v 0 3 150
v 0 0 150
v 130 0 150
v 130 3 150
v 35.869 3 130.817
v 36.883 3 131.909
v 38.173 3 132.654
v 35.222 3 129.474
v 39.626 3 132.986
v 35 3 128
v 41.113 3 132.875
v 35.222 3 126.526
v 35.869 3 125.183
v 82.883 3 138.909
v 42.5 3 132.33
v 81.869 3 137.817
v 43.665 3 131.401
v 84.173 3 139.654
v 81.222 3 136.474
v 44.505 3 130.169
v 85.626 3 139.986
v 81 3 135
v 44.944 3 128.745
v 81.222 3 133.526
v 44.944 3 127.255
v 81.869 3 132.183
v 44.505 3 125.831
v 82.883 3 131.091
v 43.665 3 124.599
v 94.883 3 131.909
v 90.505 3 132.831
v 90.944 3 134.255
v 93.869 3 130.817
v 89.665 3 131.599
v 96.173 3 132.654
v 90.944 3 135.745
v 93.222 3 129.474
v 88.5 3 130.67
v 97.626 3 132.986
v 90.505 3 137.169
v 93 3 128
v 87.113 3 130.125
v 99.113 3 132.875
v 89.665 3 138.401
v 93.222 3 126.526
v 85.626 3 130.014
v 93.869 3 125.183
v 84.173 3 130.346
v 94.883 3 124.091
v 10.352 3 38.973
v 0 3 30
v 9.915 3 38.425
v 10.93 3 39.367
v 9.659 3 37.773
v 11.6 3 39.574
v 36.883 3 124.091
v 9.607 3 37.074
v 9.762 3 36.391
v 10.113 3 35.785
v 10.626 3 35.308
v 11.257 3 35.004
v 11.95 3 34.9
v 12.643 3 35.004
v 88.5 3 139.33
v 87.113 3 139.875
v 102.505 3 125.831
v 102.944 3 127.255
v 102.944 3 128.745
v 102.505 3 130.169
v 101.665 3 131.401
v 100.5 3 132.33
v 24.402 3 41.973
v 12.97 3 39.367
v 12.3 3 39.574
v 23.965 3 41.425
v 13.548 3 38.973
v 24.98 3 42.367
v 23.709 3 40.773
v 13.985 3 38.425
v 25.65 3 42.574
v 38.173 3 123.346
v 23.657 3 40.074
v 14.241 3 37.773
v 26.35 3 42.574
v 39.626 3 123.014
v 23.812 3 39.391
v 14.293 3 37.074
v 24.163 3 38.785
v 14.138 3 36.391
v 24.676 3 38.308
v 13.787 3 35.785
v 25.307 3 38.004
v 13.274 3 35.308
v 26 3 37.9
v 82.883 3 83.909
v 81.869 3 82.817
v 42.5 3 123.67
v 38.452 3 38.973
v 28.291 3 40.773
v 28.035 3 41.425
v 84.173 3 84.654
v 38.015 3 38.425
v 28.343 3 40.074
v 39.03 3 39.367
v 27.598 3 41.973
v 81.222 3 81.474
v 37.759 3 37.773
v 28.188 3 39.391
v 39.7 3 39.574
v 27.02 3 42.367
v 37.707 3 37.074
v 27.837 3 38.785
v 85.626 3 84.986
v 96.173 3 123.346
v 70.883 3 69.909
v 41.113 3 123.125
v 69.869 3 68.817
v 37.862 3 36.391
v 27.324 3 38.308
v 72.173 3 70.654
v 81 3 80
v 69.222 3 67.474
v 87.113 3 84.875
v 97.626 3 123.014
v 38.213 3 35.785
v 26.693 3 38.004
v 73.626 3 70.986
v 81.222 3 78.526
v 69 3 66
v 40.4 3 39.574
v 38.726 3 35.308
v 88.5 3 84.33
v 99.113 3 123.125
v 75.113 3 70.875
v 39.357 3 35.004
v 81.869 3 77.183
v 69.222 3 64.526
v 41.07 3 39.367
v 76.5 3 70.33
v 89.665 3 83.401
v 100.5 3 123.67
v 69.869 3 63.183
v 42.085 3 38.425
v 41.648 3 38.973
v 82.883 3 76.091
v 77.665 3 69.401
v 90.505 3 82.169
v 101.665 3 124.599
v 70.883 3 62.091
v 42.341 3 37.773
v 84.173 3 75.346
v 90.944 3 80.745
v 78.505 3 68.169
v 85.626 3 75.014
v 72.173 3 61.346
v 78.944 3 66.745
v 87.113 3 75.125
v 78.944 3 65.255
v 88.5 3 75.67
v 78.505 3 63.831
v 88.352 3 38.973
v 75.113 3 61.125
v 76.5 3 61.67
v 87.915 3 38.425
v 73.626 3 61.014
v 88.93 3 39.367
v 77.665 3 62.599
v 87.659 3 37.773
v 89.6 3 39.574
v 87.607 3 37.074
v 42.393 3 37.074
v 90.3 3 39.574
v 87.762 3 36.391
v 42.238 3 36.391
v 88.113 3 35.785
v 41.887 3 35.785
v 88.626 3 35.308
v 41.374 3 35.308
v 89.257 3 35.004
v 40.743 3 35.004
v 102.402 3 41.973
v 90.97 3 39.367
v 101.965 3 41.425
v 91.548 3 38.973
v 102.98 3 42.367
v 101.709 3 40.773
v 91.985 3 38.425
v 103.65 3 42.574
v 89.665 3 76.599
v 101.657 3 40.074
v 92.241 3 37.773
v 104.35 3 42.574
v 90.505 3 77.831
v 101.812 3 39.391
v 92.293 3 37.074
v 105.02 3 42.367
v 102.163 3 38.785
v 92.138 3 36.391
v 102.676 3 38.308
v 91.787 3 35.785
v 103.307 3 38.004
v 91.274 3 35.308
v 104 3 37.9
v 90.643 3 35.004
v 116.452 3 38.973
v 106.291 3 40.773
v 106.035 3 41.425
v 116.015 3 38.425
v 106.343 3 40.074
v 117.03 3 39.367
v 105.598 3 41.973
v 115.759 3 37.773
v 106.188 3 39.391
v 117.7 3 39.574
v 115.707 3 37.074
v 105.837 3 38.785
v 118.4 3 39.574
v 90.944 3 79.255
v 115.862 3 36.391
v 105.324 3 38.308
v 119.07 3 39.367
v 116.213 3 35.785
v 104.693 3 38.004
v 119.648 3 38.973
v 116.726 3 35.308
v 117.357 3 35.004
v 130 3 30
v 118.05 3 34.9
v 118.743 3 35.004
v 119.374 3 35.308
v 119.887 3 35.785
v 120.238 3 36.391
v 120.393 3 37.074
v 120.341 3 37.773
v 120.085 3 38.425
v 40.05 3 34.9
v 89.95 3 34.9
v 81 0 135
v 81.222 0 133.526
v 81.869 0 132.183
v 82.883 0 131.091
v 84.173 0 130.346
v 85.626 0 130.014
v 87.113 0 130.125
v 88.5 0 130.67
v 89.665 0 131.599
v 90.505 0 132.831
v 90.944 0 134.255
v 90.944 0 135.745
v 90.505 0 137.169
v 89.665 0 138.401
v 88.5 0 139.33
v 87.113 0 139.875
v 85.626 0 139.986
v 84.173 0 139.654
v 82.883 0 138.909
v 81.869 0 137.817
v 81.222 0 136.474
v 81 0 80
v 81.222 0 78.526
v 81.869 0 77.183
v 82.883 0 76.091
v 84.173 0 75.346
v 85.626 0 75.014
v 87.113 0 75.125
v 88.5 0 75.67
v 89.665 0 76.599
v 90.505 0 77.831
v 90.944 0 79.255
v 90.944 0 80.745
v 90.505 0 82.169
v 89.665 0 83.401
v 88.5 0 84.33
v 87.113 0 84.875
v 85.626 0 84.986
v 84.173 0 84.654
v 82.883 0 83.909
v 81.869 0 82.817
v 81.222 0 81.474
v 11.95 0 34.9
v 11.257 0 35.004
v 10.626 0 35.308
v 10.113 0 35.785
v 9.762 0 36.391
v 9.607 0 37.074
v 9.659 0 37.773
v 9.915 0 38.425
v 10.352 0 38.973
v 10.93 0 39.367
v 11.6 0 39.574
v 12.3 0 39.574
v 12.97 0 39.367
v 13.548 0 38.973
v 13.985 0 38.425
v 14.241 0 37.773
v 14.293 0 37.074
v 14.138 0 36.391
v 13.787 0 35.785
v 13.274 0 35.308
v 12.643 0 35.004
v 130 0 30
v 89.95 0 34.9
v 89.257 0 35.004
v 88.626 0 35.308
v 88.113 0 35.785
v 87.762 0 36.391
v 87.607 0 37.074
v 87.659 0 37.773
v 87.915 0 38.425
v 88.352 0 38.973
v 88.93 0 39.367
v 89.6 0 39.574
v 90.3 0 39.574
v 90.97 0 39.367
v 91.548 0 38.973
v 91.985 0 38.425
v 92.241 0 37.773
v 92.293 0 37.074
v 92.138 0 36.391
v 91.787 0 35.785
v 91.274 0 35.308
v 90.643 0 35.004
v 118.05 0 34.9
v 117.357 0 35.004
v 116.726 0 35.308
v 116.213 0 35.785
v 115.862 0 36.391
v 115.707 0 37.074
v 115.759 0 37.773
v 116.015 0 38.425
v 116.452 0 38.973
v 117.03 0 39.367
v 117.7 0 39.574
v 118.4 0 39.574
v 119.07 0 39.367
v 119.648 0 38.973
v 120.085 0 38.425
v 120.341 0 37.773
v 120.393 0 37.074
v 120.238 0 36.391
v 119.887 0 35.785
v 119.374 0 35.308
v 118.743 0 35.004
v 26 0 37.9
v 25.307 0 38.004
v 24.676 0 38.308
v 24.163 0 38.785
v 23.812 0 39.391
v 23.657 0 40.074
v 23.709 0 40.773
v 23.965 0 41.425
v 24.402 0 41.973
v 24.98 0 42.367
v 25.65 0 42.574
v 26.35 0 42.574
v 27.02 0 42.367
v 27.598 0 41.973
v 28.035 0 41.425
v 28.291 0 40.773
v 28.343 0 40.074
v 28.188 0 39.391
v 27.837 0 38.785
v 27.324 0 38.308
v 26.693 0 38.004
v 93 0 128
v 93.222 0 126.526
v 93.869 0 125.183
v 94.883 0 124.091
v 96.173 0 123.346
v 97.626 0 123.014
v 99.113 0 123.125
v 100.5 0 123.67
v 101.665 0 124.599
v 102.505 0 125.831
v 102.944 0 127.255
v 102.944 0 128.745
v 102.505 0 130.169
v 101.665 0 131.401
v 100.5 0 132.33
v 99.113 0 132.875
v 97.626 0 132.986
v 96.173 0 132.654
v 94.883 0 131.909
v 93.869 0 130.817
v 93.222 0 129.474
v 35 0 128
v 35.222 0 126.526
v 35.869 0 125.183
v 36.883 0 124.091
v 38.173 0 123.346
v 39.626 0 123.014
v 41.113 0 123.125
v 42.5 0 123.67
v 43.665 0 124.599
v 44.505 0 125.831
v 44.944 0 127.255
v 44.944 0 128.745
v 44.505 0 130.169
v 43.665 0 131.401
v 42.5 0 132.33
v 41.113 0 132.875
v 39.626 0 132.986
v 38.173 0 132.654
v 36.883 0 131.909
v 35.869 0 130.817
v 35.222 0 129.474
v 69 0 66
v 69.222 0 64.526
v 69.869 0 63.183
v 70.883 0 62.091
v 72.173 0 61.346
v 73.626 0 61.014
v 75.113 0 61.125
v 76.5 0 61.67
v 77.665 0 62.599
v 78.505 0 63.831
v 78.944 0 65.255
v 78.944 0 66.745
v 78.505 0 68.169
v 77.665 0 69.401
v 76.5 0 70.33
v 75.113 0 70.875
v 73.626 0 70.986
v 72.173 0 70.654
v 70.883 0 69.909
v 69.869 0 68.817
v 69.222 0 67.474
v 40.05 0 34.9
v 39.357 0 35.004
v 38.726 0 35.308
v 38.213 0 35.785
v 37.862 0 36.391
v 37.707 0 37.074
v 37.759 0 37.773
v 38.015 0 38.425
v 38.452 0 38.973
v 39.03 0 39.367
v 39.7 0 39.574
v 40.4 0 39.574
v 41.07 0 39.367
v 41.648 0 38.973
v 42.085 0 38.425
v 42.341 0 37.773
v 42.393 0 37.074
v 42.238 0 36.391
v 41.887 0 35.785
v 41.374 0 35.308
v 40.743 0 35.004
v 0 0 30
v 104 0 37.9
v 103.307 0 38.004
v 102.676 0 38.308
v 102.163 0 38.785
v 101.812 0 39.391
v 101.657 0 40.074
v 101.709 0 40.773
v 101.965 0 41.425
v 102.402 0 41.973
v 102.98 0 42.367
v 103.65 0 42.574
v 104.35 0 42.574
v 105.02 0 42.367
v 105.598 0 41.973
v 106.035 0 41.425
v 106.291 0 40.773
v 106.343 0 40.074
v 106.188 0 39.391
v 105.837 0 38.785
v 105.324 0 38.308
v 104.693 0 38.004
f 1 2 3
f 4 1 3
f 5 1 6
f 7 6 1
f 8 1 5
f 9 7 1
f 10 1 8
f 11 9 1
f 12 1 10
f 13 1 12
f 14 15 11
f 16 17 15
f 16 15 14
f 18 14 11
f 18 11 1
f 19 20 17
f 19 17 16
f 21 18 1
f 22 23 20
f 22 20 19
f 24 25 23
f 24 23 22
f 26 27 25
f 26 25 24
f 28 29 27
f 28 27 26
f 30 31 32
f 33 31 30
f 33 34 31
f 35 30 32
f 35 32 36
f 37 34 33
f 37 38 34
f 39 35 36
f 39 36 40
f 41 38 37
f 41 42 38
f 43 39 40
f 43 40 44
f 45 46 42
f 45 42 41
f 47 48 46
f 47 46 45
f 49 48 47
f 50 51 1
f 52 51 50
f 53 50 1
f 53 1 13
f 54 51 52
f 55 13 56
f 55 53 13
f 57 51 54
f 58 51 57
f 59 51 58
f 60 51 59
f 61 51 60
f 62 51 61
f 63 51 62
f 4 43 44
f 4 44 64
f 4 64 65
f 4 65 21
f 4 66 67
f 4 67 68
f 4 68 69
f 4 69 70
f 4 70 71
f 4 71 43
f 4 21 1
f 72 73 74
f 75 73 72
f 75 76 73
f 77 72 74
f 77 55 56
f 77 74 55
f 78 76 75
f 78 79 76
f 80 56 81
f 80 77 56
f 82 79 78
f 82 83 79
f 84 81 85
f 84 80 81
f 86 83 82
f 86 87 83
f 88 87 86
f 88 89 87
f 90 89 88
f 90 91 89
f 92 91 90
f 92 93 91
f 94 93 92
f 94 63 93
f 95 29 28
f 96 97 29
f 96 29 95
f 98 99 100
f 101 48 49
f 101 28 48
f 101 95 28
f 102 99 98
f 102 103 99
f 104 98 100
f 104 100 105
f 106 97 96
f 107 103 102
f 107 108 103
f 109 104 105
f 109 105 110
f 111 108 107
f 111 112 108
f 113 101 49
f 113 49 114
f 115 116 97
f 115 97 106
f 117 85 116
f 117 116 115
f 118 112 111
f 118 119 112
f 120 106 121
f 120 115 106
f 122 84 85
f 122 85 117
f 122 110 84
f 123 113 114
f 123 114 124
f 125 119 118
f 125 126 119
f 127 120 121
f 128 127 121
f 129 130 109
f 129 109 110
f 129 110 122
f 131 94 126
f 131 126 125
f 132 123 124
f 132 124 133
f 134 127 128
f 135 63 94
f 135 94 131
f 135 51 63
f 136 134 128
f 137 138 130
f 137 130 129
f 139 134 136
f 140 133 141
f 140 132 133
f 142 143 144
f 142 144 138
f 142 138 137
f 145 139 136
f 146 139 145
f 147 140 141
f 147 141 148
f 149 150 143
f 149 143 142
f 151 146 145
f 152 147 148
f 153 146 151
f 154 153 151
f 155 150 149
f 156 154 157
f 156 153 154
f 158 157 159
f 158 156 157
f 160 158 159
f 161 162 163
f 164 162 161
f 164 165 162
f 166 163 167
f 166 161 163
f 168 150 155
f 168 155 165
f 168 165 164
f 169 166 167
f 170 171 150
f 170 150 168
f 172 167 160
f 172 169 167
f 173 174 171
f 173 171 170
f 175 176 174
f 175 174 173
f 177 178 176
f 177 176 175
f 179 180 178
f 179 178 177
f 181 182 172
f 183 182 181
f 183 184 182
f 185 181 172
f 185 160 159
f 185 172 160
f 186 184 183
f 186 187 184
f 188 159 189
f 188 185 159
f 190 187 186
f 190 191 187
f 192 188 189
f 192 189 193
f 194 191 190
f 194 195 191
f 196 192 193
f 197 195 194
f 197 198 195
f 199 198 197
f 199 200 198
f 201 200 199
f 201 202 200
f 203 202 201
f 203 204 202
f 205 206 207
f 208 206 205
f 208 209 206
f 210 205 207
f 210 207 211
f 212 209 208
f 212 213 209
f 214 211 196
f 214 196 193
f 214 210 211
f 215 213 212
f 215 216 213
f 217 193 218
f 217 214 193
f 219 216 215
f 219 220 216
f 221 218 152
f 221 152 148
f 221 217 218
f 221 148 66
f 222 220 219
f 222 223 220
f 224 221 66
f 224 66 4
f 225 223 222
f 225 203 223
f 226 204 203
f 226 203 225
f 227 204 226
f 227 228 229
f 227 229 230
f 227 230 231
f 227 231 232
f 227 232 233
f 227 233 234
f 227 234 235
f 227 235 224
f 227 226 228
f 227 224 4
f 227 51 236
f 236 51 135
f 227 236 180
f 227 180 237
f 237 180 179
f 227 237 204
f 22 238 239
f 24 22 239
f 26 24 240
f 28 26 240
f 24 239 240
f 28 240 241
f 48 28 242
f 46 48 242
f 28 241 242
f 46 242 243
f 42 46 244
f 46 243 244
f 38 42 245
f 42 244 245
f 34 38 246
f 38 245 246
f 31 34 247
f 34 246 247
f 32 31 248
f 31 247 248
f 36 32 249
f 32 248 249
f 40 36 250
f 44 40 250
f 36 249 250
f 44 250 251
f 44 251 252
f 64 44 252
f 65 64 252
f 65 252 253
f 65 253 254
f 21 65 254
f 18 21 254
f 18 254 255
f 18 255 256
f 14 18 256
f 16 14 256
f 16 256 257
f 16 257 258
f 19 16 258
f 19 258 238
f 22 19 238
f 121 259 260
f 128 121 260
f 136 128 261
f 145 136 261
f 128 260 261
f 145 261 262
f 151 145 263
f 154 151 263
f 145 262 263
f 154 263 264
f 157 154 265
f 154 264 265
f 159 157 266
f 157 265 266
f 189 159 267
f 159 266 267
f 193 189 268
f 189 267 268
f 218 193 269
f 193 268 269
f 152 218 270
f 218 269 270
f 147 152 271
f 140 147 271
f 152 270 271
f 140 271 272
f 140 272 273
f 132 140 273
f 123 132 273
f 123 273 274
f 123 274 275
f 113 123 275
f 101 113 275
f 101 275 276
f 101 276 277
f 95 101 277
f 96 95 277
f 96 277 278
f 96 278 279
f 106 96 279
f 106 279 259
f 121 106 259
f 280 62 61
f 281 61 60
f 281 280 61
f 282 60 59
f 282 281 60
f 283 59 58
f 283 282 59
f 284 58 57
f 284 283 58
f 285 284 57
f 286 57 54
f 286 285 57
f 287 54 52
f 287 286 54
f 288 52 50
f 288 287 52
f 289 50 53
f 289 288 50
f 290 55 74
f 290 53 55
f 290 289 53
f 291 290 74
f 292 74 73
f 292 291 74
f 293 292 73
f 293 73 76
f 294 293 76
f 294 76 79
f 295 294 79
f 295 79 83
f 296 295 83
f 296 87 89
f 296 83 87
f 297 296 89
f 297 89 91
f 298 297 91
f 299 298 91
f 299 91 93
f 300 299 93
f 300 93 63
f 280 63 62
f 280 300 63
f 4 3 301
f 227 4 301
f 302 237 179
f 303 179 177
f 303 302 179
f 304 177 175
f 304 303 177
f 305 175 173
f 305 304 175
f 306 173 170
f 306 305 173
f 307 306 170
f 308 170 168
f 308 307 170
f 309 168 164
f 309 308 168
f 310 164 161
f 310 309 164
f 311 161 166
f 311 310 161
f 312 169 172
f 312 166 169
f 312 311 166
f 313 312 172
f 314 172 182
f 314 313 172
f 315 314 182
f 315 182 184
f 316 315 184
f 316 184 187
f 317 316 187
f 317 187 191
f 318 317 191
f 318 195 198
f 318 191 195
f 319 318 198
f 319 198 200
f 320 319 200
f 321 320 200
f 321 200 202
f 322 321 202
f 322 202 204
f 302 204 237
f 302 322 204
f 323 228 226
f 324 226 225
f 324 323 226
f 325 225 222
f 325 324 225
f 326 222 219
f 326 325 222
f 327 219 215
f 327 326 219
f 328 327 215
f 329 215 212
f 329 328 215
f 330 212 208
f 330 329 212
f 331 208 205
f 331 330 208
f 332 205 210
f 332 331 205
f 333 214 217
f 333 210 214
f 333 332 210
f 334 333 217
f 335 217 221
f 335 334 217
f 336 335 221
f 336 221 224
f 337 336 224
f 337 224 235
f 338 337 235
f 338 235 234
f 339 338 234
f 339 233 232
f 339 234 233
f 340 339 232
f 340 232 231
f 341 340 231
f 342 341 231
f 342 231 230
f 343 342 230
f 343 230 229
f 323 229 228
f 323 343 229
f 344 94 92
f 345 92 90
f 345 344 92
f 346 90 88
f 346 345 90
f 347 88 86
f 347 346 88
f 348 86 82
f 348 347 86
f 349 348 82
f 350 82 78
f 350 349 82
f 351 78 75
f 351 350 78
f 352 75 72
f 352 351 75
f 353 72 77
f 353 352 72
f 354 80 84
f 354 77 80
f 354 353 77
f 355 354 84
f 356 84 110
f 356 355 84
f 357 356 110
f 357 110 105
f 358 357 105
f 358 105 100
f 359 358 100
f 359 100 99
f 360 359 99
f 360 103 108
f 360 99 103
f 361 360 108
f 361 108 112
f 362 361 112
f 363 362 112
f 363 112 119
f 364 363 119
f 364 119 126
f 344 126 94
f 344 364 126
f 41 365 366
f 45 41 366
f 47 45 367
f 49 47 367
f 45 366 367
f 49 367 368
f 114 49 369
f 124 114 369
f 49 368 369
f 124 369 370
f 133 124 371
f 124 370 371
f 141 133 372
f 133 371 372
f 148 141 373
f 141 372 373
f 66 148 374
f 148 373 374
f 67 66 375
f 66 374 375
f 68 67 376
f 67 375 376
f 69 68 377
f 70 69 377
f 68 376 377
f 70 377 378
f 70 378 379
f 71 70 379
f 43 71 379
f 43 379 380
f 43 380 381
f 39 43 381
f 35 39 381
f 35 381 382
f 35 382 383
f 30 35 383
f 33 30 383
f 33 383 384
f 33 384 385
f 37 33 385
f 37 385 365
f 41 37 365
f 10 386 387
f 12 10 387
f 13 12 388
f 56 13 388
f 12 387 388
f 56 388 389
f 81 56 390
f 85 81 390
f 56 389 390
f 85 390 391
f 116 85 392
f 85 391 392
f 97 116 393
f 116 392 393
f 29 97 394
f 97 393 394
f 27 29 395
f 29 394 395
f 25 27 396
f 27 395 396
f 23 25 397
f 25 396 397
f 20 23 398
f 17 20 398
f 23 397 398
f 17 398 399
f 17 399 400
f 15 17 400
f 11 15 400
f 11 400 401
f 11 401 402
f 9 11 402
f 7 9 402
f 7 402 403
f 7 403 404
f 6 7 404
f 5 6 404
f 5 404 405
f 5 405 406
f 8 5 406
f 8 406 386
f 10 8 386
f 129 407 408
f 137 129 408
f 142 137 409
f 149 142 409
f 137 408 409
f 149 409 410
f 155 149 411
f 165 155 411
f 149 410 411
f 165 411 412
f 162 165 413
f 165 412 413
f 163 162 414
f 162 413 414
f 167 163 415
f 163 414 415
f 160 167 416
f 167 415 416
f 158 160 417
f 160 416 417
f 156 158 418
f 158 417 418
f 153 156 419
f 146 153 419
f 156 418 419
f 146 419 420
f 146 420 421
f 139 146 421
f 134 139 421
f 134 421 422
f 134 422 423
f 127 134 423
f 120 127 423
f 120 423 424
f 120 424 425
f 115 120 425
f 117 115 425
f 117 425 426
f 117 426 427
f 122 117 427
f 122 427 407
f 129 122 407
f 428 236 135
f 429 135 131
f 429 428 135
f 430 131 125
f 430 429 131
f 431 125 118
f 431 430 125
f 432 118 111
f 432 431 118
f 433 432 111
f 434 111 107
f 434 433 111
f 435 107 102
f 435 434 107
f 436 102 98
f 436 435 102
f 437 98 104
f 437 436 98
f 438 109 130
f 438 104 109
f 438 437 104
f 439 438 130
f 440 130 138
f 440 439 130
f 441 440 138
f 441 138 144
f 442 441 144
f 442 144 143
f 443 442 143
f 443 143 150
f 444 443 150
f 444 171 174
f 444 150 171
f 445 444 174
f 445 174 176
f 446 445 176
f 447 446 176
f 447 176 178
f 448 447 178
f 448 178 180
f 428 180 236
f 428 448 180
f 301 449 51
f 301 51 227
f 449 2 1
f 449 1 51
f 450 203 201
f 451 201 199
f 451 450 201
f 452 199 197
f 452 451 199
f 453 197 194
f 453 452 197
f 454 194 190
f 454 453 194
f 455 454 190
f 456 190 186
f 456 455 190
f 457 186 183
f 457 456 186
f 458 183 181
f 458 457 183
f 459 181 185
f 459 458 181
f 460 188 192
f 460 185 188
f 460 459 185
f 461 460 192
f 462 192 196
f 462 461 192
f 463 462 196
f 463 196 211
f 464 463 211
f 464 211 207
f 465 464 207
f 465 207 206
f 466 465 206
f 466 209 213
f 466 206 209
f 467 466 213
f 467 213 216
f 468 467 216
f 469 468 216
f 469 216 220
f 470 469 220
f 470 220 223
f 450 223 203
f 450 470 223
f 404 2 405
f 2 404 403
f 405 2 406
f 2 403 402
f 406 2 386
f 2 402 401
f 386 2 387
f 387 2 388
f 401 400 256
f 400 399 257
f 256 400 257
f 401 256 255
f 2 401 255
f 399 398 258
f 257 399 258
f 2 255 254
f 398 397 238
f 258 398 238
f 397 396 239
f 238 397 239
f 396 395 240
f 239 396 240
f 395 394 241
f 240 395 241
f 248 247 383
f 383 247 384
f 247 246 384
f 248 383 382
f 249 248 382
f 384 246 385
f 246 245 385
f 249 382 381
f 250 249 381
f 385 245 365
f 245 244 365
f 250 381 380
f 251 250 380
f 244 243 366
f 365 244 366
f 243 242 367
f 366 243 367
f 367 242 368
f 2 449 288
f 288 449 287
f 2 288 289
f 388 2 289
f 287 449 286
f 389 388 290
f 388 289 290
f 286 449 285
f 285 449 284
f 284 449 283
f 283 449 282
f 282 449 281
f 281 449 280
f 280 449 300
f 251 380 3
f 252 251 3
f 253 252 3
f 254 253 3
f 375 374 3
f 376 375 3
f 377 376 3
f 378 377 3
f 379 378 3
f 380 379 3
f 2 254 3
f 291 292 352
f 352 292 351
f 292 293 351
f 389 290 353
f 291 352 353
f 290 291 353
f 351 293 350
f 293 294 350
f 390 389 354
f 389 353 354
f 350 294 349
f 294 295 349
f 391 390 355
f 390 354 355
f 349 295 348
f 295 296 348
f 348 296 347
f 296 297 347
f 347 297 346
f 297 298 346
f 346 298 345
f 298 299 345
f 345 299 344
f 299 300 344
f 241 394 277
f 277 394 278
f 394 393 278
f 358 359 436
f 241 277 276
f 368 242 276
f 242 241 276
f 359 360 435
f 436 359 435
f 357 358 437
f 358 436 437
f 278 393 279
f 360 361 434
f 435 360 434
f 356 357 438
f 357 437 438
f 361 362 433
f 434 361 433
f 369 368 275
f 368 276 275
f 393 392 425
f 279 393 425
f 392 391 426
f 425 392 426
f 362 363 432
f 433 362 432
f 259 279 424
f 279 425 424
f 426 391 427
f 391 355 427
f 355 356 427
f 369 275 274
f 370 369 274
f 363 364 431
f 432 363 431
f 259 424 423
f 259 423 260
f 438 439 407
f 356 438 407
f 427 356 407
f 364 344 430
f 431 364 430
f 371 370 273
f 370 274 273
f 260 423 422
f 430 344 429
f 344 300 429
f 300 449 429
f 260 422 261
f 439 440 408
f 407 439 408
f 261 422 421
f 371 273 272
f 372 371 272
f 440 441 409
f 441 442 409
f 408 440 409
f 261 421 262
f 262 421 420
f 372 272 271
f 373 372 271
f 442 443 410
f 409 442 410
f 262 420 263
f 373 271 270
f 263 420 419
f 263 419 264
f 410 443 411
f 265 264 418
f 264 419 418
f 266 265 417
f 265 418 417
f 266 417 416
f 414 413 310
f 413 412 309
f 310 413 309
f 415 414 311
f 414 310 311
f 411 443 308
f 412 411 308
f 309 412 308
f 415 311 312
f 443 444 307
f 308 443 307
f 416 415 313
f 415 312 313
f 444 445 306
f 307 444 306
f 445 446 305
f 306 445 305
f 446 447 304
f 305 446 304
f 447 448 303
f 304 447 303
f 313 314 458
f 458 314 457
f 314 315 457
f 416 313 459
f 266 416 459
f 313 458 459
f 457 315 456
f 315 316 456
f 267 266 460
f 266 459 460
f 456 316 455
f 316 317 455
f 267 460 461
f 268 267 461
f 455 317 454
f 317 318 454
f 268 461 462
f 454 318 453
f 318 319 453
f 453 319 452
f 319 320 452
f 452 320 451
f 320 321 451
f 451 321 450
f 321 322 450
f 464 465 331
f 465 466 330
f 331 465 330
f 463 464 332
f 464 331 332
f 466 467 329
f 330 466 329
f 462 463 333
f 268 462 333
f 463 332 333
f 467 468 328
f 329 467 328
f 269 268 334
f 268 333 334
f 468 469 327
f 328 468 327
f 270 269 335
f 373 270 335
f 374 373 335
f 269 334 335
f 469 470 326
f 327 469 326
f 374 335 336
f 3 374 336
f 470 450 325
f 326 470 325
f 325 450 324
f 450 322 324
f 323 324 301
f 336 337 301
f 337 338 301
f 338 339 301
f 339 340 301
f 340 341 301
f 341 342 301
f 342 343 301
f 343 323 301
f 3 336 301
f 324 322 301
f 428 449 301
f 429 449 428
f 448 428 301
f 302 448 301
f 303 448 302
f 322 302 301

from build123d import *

# Parameters (mm, degrees)
SKETCH1_W                  = 130
SKETCH1_H                  = 150
BOSS_EXTRUDE1_DEPTH        = 3
F_10_0_10_DIAMETER_HOLE2_D = 10
F_14_0_14_DIAMETER_HOLE1_D = 14
F_5_0_5_DIAMETER_HOLE1_D   = 5
F_10_0_10_DIAMETER_HOLE1_D = 10
F_9_0_9_DIAMETER_HOLE1_D   = 9
F_5_0_5_DIAMETER_HOLE2_D   = 5
SKETCH15_W                 = 130
SKETCH15_H                 = 30
CUT_EXTRUDE1_DEPTH         = 199.517001791
SKETCH16_R                 = 2.35
CUT_EXTRUDE2_DEPTH         = 199.517001791


with BuildPart() as part:
    # Sketch1 → Boss-Extrude1 (new body)
    with BuildSketch(Plane(origin=(0, 0, 0), x_dir=(1, 0, 0), z_dir=(0, 1, 0))):
        with Locations((65, -75)):
            Rectangle(SKETCH1_W, SKETCH1_H)
    extrude(amount=BOSS_EXTRUDE1_DEPTH)

    # Ø10.0 (10) Diameter Hole2 (through all)
    with Locations(Plane(origin=(0, 3, 0), x_dir=(1, 0, 0), z_dir=(0, 1, 0))):
        with Locations((40, -128), (98, -128), (74, -66)):
            Hole(F_10_0_10_DIAMETER_HOLE2_D / 2)

    # Ø14.0 (14) Diameter Hole1 (through all)
    with Locations(Plane(origin=(0, 3, 0), x_dir=(1, 0, 0), z_dir=(0, 1, 0))):
        with Locations((16, -16), (114, -16)):
            Hole(F_14_0_14_DIAMETER_HOLE1_D / 2)

    # Ø5.0 (5) Diameter Hole1 (through all)
    with Locations(Plane(origin=(0, 3, 0), x_dir=(1, 0, 0), z_dir=(0, 1, 0))):
        with Locations((4.686291501, -27.313708499), (4.686291501, -4.686291501), (27.313708499, -4.686291501), (27.313708499, -27.313708499), (102.686291501, -27.313708499), (125.313708499, -27.313708499), (125.313708499, -4.686291501), (102.686291501, -4.686291501)):
            Hole(F_5_0_5_DIAMETER_HOLE1_D / 2)

    # Ø10.0 (10) Diameter Hole1 (through all)
    with Locations(Plane(origin=(0, 3, 0), x_dir=(1, 0, 0), z_dir=(0, 1, 0))):
        with Locations((86, -135), (86, -80)):
            Hole(F_10_0_10_DIAMETER_HOLE1_D / 2)

    # Ø9.0 (9) Diameter Hole1 (through all)
    with Locations(Plane(origin=(0, 3, 0), x_dir=(1, 0, 0), z_dir=(0, 1, 0))):
        with Locations((65, -16)):
            Hole(F_9_0_9_DIAMETER_HOLE1_D / 2)

    # Ø5.0 (5) Diameter Hole2 (through all)
    with Locations(Plane(origin=(0, 3, 0), x_dir=(1, 0, 0), z_dir=(0, 1, 0))):
        with Locations((53.686291501, -27.313708499), (76.313708499, -27.313708499), (76.313708499, -4.686291501), (53.686291501, -4.686291501)):
            Hole(F_5_0_5_DIAMETER_HOLE2_D / 2)

    # Sketch15 → Cut-Extrude1 (cut, through all)
    with BuildSketch(Plane(origin=(0, 0, 0), x_dir=(1, 0, 0), z_dir=(0, 1, 0))):
        with Locations((65, -15)):
            Rectangle(SKETCH15_W, SKETCH15_H)
    extrude(amount=CUT_EXTRUDE1_DEPTH, mode=Mode.SUBTRACT)

    # Sketch16 → Cut-Extrude2 (cut, through all)
    with BuildSketch(Plane(origin=(0, 0, 0), x_dir=(1, 0, 0), z_dir=(0, 1, 0))):
        with Locations(Location((89.95, -37.25, 0), (0, 0, 90))):
            Circle(SKETCH16_R)
        with Locations(Location((118.05, -37.25, 0), (0, 0, 90))):
            Circle(SKETCH16_R)
        with Locations(Location((104, -40.25, 0), (0, 0, 90))):
            Circle(SKETCH16_R)
        with Locations(Location((11.95, -37.25, 0), (0, 0, 90))):
            Circle(SKETCH16_R)
        with Locations(Location((40.05, -37.25, 0), (0, 0, 90))):
            Circle(SKETCH16_R)
        with Locations(Location((26, -40.25, 0), (0, 0, 90))):
            Circle(SKETCH16_R)
    extrude(amount=CUT_EXTRUDE2_DEPTH, mode=Mode.SUBTRACT)


solid = part.part
